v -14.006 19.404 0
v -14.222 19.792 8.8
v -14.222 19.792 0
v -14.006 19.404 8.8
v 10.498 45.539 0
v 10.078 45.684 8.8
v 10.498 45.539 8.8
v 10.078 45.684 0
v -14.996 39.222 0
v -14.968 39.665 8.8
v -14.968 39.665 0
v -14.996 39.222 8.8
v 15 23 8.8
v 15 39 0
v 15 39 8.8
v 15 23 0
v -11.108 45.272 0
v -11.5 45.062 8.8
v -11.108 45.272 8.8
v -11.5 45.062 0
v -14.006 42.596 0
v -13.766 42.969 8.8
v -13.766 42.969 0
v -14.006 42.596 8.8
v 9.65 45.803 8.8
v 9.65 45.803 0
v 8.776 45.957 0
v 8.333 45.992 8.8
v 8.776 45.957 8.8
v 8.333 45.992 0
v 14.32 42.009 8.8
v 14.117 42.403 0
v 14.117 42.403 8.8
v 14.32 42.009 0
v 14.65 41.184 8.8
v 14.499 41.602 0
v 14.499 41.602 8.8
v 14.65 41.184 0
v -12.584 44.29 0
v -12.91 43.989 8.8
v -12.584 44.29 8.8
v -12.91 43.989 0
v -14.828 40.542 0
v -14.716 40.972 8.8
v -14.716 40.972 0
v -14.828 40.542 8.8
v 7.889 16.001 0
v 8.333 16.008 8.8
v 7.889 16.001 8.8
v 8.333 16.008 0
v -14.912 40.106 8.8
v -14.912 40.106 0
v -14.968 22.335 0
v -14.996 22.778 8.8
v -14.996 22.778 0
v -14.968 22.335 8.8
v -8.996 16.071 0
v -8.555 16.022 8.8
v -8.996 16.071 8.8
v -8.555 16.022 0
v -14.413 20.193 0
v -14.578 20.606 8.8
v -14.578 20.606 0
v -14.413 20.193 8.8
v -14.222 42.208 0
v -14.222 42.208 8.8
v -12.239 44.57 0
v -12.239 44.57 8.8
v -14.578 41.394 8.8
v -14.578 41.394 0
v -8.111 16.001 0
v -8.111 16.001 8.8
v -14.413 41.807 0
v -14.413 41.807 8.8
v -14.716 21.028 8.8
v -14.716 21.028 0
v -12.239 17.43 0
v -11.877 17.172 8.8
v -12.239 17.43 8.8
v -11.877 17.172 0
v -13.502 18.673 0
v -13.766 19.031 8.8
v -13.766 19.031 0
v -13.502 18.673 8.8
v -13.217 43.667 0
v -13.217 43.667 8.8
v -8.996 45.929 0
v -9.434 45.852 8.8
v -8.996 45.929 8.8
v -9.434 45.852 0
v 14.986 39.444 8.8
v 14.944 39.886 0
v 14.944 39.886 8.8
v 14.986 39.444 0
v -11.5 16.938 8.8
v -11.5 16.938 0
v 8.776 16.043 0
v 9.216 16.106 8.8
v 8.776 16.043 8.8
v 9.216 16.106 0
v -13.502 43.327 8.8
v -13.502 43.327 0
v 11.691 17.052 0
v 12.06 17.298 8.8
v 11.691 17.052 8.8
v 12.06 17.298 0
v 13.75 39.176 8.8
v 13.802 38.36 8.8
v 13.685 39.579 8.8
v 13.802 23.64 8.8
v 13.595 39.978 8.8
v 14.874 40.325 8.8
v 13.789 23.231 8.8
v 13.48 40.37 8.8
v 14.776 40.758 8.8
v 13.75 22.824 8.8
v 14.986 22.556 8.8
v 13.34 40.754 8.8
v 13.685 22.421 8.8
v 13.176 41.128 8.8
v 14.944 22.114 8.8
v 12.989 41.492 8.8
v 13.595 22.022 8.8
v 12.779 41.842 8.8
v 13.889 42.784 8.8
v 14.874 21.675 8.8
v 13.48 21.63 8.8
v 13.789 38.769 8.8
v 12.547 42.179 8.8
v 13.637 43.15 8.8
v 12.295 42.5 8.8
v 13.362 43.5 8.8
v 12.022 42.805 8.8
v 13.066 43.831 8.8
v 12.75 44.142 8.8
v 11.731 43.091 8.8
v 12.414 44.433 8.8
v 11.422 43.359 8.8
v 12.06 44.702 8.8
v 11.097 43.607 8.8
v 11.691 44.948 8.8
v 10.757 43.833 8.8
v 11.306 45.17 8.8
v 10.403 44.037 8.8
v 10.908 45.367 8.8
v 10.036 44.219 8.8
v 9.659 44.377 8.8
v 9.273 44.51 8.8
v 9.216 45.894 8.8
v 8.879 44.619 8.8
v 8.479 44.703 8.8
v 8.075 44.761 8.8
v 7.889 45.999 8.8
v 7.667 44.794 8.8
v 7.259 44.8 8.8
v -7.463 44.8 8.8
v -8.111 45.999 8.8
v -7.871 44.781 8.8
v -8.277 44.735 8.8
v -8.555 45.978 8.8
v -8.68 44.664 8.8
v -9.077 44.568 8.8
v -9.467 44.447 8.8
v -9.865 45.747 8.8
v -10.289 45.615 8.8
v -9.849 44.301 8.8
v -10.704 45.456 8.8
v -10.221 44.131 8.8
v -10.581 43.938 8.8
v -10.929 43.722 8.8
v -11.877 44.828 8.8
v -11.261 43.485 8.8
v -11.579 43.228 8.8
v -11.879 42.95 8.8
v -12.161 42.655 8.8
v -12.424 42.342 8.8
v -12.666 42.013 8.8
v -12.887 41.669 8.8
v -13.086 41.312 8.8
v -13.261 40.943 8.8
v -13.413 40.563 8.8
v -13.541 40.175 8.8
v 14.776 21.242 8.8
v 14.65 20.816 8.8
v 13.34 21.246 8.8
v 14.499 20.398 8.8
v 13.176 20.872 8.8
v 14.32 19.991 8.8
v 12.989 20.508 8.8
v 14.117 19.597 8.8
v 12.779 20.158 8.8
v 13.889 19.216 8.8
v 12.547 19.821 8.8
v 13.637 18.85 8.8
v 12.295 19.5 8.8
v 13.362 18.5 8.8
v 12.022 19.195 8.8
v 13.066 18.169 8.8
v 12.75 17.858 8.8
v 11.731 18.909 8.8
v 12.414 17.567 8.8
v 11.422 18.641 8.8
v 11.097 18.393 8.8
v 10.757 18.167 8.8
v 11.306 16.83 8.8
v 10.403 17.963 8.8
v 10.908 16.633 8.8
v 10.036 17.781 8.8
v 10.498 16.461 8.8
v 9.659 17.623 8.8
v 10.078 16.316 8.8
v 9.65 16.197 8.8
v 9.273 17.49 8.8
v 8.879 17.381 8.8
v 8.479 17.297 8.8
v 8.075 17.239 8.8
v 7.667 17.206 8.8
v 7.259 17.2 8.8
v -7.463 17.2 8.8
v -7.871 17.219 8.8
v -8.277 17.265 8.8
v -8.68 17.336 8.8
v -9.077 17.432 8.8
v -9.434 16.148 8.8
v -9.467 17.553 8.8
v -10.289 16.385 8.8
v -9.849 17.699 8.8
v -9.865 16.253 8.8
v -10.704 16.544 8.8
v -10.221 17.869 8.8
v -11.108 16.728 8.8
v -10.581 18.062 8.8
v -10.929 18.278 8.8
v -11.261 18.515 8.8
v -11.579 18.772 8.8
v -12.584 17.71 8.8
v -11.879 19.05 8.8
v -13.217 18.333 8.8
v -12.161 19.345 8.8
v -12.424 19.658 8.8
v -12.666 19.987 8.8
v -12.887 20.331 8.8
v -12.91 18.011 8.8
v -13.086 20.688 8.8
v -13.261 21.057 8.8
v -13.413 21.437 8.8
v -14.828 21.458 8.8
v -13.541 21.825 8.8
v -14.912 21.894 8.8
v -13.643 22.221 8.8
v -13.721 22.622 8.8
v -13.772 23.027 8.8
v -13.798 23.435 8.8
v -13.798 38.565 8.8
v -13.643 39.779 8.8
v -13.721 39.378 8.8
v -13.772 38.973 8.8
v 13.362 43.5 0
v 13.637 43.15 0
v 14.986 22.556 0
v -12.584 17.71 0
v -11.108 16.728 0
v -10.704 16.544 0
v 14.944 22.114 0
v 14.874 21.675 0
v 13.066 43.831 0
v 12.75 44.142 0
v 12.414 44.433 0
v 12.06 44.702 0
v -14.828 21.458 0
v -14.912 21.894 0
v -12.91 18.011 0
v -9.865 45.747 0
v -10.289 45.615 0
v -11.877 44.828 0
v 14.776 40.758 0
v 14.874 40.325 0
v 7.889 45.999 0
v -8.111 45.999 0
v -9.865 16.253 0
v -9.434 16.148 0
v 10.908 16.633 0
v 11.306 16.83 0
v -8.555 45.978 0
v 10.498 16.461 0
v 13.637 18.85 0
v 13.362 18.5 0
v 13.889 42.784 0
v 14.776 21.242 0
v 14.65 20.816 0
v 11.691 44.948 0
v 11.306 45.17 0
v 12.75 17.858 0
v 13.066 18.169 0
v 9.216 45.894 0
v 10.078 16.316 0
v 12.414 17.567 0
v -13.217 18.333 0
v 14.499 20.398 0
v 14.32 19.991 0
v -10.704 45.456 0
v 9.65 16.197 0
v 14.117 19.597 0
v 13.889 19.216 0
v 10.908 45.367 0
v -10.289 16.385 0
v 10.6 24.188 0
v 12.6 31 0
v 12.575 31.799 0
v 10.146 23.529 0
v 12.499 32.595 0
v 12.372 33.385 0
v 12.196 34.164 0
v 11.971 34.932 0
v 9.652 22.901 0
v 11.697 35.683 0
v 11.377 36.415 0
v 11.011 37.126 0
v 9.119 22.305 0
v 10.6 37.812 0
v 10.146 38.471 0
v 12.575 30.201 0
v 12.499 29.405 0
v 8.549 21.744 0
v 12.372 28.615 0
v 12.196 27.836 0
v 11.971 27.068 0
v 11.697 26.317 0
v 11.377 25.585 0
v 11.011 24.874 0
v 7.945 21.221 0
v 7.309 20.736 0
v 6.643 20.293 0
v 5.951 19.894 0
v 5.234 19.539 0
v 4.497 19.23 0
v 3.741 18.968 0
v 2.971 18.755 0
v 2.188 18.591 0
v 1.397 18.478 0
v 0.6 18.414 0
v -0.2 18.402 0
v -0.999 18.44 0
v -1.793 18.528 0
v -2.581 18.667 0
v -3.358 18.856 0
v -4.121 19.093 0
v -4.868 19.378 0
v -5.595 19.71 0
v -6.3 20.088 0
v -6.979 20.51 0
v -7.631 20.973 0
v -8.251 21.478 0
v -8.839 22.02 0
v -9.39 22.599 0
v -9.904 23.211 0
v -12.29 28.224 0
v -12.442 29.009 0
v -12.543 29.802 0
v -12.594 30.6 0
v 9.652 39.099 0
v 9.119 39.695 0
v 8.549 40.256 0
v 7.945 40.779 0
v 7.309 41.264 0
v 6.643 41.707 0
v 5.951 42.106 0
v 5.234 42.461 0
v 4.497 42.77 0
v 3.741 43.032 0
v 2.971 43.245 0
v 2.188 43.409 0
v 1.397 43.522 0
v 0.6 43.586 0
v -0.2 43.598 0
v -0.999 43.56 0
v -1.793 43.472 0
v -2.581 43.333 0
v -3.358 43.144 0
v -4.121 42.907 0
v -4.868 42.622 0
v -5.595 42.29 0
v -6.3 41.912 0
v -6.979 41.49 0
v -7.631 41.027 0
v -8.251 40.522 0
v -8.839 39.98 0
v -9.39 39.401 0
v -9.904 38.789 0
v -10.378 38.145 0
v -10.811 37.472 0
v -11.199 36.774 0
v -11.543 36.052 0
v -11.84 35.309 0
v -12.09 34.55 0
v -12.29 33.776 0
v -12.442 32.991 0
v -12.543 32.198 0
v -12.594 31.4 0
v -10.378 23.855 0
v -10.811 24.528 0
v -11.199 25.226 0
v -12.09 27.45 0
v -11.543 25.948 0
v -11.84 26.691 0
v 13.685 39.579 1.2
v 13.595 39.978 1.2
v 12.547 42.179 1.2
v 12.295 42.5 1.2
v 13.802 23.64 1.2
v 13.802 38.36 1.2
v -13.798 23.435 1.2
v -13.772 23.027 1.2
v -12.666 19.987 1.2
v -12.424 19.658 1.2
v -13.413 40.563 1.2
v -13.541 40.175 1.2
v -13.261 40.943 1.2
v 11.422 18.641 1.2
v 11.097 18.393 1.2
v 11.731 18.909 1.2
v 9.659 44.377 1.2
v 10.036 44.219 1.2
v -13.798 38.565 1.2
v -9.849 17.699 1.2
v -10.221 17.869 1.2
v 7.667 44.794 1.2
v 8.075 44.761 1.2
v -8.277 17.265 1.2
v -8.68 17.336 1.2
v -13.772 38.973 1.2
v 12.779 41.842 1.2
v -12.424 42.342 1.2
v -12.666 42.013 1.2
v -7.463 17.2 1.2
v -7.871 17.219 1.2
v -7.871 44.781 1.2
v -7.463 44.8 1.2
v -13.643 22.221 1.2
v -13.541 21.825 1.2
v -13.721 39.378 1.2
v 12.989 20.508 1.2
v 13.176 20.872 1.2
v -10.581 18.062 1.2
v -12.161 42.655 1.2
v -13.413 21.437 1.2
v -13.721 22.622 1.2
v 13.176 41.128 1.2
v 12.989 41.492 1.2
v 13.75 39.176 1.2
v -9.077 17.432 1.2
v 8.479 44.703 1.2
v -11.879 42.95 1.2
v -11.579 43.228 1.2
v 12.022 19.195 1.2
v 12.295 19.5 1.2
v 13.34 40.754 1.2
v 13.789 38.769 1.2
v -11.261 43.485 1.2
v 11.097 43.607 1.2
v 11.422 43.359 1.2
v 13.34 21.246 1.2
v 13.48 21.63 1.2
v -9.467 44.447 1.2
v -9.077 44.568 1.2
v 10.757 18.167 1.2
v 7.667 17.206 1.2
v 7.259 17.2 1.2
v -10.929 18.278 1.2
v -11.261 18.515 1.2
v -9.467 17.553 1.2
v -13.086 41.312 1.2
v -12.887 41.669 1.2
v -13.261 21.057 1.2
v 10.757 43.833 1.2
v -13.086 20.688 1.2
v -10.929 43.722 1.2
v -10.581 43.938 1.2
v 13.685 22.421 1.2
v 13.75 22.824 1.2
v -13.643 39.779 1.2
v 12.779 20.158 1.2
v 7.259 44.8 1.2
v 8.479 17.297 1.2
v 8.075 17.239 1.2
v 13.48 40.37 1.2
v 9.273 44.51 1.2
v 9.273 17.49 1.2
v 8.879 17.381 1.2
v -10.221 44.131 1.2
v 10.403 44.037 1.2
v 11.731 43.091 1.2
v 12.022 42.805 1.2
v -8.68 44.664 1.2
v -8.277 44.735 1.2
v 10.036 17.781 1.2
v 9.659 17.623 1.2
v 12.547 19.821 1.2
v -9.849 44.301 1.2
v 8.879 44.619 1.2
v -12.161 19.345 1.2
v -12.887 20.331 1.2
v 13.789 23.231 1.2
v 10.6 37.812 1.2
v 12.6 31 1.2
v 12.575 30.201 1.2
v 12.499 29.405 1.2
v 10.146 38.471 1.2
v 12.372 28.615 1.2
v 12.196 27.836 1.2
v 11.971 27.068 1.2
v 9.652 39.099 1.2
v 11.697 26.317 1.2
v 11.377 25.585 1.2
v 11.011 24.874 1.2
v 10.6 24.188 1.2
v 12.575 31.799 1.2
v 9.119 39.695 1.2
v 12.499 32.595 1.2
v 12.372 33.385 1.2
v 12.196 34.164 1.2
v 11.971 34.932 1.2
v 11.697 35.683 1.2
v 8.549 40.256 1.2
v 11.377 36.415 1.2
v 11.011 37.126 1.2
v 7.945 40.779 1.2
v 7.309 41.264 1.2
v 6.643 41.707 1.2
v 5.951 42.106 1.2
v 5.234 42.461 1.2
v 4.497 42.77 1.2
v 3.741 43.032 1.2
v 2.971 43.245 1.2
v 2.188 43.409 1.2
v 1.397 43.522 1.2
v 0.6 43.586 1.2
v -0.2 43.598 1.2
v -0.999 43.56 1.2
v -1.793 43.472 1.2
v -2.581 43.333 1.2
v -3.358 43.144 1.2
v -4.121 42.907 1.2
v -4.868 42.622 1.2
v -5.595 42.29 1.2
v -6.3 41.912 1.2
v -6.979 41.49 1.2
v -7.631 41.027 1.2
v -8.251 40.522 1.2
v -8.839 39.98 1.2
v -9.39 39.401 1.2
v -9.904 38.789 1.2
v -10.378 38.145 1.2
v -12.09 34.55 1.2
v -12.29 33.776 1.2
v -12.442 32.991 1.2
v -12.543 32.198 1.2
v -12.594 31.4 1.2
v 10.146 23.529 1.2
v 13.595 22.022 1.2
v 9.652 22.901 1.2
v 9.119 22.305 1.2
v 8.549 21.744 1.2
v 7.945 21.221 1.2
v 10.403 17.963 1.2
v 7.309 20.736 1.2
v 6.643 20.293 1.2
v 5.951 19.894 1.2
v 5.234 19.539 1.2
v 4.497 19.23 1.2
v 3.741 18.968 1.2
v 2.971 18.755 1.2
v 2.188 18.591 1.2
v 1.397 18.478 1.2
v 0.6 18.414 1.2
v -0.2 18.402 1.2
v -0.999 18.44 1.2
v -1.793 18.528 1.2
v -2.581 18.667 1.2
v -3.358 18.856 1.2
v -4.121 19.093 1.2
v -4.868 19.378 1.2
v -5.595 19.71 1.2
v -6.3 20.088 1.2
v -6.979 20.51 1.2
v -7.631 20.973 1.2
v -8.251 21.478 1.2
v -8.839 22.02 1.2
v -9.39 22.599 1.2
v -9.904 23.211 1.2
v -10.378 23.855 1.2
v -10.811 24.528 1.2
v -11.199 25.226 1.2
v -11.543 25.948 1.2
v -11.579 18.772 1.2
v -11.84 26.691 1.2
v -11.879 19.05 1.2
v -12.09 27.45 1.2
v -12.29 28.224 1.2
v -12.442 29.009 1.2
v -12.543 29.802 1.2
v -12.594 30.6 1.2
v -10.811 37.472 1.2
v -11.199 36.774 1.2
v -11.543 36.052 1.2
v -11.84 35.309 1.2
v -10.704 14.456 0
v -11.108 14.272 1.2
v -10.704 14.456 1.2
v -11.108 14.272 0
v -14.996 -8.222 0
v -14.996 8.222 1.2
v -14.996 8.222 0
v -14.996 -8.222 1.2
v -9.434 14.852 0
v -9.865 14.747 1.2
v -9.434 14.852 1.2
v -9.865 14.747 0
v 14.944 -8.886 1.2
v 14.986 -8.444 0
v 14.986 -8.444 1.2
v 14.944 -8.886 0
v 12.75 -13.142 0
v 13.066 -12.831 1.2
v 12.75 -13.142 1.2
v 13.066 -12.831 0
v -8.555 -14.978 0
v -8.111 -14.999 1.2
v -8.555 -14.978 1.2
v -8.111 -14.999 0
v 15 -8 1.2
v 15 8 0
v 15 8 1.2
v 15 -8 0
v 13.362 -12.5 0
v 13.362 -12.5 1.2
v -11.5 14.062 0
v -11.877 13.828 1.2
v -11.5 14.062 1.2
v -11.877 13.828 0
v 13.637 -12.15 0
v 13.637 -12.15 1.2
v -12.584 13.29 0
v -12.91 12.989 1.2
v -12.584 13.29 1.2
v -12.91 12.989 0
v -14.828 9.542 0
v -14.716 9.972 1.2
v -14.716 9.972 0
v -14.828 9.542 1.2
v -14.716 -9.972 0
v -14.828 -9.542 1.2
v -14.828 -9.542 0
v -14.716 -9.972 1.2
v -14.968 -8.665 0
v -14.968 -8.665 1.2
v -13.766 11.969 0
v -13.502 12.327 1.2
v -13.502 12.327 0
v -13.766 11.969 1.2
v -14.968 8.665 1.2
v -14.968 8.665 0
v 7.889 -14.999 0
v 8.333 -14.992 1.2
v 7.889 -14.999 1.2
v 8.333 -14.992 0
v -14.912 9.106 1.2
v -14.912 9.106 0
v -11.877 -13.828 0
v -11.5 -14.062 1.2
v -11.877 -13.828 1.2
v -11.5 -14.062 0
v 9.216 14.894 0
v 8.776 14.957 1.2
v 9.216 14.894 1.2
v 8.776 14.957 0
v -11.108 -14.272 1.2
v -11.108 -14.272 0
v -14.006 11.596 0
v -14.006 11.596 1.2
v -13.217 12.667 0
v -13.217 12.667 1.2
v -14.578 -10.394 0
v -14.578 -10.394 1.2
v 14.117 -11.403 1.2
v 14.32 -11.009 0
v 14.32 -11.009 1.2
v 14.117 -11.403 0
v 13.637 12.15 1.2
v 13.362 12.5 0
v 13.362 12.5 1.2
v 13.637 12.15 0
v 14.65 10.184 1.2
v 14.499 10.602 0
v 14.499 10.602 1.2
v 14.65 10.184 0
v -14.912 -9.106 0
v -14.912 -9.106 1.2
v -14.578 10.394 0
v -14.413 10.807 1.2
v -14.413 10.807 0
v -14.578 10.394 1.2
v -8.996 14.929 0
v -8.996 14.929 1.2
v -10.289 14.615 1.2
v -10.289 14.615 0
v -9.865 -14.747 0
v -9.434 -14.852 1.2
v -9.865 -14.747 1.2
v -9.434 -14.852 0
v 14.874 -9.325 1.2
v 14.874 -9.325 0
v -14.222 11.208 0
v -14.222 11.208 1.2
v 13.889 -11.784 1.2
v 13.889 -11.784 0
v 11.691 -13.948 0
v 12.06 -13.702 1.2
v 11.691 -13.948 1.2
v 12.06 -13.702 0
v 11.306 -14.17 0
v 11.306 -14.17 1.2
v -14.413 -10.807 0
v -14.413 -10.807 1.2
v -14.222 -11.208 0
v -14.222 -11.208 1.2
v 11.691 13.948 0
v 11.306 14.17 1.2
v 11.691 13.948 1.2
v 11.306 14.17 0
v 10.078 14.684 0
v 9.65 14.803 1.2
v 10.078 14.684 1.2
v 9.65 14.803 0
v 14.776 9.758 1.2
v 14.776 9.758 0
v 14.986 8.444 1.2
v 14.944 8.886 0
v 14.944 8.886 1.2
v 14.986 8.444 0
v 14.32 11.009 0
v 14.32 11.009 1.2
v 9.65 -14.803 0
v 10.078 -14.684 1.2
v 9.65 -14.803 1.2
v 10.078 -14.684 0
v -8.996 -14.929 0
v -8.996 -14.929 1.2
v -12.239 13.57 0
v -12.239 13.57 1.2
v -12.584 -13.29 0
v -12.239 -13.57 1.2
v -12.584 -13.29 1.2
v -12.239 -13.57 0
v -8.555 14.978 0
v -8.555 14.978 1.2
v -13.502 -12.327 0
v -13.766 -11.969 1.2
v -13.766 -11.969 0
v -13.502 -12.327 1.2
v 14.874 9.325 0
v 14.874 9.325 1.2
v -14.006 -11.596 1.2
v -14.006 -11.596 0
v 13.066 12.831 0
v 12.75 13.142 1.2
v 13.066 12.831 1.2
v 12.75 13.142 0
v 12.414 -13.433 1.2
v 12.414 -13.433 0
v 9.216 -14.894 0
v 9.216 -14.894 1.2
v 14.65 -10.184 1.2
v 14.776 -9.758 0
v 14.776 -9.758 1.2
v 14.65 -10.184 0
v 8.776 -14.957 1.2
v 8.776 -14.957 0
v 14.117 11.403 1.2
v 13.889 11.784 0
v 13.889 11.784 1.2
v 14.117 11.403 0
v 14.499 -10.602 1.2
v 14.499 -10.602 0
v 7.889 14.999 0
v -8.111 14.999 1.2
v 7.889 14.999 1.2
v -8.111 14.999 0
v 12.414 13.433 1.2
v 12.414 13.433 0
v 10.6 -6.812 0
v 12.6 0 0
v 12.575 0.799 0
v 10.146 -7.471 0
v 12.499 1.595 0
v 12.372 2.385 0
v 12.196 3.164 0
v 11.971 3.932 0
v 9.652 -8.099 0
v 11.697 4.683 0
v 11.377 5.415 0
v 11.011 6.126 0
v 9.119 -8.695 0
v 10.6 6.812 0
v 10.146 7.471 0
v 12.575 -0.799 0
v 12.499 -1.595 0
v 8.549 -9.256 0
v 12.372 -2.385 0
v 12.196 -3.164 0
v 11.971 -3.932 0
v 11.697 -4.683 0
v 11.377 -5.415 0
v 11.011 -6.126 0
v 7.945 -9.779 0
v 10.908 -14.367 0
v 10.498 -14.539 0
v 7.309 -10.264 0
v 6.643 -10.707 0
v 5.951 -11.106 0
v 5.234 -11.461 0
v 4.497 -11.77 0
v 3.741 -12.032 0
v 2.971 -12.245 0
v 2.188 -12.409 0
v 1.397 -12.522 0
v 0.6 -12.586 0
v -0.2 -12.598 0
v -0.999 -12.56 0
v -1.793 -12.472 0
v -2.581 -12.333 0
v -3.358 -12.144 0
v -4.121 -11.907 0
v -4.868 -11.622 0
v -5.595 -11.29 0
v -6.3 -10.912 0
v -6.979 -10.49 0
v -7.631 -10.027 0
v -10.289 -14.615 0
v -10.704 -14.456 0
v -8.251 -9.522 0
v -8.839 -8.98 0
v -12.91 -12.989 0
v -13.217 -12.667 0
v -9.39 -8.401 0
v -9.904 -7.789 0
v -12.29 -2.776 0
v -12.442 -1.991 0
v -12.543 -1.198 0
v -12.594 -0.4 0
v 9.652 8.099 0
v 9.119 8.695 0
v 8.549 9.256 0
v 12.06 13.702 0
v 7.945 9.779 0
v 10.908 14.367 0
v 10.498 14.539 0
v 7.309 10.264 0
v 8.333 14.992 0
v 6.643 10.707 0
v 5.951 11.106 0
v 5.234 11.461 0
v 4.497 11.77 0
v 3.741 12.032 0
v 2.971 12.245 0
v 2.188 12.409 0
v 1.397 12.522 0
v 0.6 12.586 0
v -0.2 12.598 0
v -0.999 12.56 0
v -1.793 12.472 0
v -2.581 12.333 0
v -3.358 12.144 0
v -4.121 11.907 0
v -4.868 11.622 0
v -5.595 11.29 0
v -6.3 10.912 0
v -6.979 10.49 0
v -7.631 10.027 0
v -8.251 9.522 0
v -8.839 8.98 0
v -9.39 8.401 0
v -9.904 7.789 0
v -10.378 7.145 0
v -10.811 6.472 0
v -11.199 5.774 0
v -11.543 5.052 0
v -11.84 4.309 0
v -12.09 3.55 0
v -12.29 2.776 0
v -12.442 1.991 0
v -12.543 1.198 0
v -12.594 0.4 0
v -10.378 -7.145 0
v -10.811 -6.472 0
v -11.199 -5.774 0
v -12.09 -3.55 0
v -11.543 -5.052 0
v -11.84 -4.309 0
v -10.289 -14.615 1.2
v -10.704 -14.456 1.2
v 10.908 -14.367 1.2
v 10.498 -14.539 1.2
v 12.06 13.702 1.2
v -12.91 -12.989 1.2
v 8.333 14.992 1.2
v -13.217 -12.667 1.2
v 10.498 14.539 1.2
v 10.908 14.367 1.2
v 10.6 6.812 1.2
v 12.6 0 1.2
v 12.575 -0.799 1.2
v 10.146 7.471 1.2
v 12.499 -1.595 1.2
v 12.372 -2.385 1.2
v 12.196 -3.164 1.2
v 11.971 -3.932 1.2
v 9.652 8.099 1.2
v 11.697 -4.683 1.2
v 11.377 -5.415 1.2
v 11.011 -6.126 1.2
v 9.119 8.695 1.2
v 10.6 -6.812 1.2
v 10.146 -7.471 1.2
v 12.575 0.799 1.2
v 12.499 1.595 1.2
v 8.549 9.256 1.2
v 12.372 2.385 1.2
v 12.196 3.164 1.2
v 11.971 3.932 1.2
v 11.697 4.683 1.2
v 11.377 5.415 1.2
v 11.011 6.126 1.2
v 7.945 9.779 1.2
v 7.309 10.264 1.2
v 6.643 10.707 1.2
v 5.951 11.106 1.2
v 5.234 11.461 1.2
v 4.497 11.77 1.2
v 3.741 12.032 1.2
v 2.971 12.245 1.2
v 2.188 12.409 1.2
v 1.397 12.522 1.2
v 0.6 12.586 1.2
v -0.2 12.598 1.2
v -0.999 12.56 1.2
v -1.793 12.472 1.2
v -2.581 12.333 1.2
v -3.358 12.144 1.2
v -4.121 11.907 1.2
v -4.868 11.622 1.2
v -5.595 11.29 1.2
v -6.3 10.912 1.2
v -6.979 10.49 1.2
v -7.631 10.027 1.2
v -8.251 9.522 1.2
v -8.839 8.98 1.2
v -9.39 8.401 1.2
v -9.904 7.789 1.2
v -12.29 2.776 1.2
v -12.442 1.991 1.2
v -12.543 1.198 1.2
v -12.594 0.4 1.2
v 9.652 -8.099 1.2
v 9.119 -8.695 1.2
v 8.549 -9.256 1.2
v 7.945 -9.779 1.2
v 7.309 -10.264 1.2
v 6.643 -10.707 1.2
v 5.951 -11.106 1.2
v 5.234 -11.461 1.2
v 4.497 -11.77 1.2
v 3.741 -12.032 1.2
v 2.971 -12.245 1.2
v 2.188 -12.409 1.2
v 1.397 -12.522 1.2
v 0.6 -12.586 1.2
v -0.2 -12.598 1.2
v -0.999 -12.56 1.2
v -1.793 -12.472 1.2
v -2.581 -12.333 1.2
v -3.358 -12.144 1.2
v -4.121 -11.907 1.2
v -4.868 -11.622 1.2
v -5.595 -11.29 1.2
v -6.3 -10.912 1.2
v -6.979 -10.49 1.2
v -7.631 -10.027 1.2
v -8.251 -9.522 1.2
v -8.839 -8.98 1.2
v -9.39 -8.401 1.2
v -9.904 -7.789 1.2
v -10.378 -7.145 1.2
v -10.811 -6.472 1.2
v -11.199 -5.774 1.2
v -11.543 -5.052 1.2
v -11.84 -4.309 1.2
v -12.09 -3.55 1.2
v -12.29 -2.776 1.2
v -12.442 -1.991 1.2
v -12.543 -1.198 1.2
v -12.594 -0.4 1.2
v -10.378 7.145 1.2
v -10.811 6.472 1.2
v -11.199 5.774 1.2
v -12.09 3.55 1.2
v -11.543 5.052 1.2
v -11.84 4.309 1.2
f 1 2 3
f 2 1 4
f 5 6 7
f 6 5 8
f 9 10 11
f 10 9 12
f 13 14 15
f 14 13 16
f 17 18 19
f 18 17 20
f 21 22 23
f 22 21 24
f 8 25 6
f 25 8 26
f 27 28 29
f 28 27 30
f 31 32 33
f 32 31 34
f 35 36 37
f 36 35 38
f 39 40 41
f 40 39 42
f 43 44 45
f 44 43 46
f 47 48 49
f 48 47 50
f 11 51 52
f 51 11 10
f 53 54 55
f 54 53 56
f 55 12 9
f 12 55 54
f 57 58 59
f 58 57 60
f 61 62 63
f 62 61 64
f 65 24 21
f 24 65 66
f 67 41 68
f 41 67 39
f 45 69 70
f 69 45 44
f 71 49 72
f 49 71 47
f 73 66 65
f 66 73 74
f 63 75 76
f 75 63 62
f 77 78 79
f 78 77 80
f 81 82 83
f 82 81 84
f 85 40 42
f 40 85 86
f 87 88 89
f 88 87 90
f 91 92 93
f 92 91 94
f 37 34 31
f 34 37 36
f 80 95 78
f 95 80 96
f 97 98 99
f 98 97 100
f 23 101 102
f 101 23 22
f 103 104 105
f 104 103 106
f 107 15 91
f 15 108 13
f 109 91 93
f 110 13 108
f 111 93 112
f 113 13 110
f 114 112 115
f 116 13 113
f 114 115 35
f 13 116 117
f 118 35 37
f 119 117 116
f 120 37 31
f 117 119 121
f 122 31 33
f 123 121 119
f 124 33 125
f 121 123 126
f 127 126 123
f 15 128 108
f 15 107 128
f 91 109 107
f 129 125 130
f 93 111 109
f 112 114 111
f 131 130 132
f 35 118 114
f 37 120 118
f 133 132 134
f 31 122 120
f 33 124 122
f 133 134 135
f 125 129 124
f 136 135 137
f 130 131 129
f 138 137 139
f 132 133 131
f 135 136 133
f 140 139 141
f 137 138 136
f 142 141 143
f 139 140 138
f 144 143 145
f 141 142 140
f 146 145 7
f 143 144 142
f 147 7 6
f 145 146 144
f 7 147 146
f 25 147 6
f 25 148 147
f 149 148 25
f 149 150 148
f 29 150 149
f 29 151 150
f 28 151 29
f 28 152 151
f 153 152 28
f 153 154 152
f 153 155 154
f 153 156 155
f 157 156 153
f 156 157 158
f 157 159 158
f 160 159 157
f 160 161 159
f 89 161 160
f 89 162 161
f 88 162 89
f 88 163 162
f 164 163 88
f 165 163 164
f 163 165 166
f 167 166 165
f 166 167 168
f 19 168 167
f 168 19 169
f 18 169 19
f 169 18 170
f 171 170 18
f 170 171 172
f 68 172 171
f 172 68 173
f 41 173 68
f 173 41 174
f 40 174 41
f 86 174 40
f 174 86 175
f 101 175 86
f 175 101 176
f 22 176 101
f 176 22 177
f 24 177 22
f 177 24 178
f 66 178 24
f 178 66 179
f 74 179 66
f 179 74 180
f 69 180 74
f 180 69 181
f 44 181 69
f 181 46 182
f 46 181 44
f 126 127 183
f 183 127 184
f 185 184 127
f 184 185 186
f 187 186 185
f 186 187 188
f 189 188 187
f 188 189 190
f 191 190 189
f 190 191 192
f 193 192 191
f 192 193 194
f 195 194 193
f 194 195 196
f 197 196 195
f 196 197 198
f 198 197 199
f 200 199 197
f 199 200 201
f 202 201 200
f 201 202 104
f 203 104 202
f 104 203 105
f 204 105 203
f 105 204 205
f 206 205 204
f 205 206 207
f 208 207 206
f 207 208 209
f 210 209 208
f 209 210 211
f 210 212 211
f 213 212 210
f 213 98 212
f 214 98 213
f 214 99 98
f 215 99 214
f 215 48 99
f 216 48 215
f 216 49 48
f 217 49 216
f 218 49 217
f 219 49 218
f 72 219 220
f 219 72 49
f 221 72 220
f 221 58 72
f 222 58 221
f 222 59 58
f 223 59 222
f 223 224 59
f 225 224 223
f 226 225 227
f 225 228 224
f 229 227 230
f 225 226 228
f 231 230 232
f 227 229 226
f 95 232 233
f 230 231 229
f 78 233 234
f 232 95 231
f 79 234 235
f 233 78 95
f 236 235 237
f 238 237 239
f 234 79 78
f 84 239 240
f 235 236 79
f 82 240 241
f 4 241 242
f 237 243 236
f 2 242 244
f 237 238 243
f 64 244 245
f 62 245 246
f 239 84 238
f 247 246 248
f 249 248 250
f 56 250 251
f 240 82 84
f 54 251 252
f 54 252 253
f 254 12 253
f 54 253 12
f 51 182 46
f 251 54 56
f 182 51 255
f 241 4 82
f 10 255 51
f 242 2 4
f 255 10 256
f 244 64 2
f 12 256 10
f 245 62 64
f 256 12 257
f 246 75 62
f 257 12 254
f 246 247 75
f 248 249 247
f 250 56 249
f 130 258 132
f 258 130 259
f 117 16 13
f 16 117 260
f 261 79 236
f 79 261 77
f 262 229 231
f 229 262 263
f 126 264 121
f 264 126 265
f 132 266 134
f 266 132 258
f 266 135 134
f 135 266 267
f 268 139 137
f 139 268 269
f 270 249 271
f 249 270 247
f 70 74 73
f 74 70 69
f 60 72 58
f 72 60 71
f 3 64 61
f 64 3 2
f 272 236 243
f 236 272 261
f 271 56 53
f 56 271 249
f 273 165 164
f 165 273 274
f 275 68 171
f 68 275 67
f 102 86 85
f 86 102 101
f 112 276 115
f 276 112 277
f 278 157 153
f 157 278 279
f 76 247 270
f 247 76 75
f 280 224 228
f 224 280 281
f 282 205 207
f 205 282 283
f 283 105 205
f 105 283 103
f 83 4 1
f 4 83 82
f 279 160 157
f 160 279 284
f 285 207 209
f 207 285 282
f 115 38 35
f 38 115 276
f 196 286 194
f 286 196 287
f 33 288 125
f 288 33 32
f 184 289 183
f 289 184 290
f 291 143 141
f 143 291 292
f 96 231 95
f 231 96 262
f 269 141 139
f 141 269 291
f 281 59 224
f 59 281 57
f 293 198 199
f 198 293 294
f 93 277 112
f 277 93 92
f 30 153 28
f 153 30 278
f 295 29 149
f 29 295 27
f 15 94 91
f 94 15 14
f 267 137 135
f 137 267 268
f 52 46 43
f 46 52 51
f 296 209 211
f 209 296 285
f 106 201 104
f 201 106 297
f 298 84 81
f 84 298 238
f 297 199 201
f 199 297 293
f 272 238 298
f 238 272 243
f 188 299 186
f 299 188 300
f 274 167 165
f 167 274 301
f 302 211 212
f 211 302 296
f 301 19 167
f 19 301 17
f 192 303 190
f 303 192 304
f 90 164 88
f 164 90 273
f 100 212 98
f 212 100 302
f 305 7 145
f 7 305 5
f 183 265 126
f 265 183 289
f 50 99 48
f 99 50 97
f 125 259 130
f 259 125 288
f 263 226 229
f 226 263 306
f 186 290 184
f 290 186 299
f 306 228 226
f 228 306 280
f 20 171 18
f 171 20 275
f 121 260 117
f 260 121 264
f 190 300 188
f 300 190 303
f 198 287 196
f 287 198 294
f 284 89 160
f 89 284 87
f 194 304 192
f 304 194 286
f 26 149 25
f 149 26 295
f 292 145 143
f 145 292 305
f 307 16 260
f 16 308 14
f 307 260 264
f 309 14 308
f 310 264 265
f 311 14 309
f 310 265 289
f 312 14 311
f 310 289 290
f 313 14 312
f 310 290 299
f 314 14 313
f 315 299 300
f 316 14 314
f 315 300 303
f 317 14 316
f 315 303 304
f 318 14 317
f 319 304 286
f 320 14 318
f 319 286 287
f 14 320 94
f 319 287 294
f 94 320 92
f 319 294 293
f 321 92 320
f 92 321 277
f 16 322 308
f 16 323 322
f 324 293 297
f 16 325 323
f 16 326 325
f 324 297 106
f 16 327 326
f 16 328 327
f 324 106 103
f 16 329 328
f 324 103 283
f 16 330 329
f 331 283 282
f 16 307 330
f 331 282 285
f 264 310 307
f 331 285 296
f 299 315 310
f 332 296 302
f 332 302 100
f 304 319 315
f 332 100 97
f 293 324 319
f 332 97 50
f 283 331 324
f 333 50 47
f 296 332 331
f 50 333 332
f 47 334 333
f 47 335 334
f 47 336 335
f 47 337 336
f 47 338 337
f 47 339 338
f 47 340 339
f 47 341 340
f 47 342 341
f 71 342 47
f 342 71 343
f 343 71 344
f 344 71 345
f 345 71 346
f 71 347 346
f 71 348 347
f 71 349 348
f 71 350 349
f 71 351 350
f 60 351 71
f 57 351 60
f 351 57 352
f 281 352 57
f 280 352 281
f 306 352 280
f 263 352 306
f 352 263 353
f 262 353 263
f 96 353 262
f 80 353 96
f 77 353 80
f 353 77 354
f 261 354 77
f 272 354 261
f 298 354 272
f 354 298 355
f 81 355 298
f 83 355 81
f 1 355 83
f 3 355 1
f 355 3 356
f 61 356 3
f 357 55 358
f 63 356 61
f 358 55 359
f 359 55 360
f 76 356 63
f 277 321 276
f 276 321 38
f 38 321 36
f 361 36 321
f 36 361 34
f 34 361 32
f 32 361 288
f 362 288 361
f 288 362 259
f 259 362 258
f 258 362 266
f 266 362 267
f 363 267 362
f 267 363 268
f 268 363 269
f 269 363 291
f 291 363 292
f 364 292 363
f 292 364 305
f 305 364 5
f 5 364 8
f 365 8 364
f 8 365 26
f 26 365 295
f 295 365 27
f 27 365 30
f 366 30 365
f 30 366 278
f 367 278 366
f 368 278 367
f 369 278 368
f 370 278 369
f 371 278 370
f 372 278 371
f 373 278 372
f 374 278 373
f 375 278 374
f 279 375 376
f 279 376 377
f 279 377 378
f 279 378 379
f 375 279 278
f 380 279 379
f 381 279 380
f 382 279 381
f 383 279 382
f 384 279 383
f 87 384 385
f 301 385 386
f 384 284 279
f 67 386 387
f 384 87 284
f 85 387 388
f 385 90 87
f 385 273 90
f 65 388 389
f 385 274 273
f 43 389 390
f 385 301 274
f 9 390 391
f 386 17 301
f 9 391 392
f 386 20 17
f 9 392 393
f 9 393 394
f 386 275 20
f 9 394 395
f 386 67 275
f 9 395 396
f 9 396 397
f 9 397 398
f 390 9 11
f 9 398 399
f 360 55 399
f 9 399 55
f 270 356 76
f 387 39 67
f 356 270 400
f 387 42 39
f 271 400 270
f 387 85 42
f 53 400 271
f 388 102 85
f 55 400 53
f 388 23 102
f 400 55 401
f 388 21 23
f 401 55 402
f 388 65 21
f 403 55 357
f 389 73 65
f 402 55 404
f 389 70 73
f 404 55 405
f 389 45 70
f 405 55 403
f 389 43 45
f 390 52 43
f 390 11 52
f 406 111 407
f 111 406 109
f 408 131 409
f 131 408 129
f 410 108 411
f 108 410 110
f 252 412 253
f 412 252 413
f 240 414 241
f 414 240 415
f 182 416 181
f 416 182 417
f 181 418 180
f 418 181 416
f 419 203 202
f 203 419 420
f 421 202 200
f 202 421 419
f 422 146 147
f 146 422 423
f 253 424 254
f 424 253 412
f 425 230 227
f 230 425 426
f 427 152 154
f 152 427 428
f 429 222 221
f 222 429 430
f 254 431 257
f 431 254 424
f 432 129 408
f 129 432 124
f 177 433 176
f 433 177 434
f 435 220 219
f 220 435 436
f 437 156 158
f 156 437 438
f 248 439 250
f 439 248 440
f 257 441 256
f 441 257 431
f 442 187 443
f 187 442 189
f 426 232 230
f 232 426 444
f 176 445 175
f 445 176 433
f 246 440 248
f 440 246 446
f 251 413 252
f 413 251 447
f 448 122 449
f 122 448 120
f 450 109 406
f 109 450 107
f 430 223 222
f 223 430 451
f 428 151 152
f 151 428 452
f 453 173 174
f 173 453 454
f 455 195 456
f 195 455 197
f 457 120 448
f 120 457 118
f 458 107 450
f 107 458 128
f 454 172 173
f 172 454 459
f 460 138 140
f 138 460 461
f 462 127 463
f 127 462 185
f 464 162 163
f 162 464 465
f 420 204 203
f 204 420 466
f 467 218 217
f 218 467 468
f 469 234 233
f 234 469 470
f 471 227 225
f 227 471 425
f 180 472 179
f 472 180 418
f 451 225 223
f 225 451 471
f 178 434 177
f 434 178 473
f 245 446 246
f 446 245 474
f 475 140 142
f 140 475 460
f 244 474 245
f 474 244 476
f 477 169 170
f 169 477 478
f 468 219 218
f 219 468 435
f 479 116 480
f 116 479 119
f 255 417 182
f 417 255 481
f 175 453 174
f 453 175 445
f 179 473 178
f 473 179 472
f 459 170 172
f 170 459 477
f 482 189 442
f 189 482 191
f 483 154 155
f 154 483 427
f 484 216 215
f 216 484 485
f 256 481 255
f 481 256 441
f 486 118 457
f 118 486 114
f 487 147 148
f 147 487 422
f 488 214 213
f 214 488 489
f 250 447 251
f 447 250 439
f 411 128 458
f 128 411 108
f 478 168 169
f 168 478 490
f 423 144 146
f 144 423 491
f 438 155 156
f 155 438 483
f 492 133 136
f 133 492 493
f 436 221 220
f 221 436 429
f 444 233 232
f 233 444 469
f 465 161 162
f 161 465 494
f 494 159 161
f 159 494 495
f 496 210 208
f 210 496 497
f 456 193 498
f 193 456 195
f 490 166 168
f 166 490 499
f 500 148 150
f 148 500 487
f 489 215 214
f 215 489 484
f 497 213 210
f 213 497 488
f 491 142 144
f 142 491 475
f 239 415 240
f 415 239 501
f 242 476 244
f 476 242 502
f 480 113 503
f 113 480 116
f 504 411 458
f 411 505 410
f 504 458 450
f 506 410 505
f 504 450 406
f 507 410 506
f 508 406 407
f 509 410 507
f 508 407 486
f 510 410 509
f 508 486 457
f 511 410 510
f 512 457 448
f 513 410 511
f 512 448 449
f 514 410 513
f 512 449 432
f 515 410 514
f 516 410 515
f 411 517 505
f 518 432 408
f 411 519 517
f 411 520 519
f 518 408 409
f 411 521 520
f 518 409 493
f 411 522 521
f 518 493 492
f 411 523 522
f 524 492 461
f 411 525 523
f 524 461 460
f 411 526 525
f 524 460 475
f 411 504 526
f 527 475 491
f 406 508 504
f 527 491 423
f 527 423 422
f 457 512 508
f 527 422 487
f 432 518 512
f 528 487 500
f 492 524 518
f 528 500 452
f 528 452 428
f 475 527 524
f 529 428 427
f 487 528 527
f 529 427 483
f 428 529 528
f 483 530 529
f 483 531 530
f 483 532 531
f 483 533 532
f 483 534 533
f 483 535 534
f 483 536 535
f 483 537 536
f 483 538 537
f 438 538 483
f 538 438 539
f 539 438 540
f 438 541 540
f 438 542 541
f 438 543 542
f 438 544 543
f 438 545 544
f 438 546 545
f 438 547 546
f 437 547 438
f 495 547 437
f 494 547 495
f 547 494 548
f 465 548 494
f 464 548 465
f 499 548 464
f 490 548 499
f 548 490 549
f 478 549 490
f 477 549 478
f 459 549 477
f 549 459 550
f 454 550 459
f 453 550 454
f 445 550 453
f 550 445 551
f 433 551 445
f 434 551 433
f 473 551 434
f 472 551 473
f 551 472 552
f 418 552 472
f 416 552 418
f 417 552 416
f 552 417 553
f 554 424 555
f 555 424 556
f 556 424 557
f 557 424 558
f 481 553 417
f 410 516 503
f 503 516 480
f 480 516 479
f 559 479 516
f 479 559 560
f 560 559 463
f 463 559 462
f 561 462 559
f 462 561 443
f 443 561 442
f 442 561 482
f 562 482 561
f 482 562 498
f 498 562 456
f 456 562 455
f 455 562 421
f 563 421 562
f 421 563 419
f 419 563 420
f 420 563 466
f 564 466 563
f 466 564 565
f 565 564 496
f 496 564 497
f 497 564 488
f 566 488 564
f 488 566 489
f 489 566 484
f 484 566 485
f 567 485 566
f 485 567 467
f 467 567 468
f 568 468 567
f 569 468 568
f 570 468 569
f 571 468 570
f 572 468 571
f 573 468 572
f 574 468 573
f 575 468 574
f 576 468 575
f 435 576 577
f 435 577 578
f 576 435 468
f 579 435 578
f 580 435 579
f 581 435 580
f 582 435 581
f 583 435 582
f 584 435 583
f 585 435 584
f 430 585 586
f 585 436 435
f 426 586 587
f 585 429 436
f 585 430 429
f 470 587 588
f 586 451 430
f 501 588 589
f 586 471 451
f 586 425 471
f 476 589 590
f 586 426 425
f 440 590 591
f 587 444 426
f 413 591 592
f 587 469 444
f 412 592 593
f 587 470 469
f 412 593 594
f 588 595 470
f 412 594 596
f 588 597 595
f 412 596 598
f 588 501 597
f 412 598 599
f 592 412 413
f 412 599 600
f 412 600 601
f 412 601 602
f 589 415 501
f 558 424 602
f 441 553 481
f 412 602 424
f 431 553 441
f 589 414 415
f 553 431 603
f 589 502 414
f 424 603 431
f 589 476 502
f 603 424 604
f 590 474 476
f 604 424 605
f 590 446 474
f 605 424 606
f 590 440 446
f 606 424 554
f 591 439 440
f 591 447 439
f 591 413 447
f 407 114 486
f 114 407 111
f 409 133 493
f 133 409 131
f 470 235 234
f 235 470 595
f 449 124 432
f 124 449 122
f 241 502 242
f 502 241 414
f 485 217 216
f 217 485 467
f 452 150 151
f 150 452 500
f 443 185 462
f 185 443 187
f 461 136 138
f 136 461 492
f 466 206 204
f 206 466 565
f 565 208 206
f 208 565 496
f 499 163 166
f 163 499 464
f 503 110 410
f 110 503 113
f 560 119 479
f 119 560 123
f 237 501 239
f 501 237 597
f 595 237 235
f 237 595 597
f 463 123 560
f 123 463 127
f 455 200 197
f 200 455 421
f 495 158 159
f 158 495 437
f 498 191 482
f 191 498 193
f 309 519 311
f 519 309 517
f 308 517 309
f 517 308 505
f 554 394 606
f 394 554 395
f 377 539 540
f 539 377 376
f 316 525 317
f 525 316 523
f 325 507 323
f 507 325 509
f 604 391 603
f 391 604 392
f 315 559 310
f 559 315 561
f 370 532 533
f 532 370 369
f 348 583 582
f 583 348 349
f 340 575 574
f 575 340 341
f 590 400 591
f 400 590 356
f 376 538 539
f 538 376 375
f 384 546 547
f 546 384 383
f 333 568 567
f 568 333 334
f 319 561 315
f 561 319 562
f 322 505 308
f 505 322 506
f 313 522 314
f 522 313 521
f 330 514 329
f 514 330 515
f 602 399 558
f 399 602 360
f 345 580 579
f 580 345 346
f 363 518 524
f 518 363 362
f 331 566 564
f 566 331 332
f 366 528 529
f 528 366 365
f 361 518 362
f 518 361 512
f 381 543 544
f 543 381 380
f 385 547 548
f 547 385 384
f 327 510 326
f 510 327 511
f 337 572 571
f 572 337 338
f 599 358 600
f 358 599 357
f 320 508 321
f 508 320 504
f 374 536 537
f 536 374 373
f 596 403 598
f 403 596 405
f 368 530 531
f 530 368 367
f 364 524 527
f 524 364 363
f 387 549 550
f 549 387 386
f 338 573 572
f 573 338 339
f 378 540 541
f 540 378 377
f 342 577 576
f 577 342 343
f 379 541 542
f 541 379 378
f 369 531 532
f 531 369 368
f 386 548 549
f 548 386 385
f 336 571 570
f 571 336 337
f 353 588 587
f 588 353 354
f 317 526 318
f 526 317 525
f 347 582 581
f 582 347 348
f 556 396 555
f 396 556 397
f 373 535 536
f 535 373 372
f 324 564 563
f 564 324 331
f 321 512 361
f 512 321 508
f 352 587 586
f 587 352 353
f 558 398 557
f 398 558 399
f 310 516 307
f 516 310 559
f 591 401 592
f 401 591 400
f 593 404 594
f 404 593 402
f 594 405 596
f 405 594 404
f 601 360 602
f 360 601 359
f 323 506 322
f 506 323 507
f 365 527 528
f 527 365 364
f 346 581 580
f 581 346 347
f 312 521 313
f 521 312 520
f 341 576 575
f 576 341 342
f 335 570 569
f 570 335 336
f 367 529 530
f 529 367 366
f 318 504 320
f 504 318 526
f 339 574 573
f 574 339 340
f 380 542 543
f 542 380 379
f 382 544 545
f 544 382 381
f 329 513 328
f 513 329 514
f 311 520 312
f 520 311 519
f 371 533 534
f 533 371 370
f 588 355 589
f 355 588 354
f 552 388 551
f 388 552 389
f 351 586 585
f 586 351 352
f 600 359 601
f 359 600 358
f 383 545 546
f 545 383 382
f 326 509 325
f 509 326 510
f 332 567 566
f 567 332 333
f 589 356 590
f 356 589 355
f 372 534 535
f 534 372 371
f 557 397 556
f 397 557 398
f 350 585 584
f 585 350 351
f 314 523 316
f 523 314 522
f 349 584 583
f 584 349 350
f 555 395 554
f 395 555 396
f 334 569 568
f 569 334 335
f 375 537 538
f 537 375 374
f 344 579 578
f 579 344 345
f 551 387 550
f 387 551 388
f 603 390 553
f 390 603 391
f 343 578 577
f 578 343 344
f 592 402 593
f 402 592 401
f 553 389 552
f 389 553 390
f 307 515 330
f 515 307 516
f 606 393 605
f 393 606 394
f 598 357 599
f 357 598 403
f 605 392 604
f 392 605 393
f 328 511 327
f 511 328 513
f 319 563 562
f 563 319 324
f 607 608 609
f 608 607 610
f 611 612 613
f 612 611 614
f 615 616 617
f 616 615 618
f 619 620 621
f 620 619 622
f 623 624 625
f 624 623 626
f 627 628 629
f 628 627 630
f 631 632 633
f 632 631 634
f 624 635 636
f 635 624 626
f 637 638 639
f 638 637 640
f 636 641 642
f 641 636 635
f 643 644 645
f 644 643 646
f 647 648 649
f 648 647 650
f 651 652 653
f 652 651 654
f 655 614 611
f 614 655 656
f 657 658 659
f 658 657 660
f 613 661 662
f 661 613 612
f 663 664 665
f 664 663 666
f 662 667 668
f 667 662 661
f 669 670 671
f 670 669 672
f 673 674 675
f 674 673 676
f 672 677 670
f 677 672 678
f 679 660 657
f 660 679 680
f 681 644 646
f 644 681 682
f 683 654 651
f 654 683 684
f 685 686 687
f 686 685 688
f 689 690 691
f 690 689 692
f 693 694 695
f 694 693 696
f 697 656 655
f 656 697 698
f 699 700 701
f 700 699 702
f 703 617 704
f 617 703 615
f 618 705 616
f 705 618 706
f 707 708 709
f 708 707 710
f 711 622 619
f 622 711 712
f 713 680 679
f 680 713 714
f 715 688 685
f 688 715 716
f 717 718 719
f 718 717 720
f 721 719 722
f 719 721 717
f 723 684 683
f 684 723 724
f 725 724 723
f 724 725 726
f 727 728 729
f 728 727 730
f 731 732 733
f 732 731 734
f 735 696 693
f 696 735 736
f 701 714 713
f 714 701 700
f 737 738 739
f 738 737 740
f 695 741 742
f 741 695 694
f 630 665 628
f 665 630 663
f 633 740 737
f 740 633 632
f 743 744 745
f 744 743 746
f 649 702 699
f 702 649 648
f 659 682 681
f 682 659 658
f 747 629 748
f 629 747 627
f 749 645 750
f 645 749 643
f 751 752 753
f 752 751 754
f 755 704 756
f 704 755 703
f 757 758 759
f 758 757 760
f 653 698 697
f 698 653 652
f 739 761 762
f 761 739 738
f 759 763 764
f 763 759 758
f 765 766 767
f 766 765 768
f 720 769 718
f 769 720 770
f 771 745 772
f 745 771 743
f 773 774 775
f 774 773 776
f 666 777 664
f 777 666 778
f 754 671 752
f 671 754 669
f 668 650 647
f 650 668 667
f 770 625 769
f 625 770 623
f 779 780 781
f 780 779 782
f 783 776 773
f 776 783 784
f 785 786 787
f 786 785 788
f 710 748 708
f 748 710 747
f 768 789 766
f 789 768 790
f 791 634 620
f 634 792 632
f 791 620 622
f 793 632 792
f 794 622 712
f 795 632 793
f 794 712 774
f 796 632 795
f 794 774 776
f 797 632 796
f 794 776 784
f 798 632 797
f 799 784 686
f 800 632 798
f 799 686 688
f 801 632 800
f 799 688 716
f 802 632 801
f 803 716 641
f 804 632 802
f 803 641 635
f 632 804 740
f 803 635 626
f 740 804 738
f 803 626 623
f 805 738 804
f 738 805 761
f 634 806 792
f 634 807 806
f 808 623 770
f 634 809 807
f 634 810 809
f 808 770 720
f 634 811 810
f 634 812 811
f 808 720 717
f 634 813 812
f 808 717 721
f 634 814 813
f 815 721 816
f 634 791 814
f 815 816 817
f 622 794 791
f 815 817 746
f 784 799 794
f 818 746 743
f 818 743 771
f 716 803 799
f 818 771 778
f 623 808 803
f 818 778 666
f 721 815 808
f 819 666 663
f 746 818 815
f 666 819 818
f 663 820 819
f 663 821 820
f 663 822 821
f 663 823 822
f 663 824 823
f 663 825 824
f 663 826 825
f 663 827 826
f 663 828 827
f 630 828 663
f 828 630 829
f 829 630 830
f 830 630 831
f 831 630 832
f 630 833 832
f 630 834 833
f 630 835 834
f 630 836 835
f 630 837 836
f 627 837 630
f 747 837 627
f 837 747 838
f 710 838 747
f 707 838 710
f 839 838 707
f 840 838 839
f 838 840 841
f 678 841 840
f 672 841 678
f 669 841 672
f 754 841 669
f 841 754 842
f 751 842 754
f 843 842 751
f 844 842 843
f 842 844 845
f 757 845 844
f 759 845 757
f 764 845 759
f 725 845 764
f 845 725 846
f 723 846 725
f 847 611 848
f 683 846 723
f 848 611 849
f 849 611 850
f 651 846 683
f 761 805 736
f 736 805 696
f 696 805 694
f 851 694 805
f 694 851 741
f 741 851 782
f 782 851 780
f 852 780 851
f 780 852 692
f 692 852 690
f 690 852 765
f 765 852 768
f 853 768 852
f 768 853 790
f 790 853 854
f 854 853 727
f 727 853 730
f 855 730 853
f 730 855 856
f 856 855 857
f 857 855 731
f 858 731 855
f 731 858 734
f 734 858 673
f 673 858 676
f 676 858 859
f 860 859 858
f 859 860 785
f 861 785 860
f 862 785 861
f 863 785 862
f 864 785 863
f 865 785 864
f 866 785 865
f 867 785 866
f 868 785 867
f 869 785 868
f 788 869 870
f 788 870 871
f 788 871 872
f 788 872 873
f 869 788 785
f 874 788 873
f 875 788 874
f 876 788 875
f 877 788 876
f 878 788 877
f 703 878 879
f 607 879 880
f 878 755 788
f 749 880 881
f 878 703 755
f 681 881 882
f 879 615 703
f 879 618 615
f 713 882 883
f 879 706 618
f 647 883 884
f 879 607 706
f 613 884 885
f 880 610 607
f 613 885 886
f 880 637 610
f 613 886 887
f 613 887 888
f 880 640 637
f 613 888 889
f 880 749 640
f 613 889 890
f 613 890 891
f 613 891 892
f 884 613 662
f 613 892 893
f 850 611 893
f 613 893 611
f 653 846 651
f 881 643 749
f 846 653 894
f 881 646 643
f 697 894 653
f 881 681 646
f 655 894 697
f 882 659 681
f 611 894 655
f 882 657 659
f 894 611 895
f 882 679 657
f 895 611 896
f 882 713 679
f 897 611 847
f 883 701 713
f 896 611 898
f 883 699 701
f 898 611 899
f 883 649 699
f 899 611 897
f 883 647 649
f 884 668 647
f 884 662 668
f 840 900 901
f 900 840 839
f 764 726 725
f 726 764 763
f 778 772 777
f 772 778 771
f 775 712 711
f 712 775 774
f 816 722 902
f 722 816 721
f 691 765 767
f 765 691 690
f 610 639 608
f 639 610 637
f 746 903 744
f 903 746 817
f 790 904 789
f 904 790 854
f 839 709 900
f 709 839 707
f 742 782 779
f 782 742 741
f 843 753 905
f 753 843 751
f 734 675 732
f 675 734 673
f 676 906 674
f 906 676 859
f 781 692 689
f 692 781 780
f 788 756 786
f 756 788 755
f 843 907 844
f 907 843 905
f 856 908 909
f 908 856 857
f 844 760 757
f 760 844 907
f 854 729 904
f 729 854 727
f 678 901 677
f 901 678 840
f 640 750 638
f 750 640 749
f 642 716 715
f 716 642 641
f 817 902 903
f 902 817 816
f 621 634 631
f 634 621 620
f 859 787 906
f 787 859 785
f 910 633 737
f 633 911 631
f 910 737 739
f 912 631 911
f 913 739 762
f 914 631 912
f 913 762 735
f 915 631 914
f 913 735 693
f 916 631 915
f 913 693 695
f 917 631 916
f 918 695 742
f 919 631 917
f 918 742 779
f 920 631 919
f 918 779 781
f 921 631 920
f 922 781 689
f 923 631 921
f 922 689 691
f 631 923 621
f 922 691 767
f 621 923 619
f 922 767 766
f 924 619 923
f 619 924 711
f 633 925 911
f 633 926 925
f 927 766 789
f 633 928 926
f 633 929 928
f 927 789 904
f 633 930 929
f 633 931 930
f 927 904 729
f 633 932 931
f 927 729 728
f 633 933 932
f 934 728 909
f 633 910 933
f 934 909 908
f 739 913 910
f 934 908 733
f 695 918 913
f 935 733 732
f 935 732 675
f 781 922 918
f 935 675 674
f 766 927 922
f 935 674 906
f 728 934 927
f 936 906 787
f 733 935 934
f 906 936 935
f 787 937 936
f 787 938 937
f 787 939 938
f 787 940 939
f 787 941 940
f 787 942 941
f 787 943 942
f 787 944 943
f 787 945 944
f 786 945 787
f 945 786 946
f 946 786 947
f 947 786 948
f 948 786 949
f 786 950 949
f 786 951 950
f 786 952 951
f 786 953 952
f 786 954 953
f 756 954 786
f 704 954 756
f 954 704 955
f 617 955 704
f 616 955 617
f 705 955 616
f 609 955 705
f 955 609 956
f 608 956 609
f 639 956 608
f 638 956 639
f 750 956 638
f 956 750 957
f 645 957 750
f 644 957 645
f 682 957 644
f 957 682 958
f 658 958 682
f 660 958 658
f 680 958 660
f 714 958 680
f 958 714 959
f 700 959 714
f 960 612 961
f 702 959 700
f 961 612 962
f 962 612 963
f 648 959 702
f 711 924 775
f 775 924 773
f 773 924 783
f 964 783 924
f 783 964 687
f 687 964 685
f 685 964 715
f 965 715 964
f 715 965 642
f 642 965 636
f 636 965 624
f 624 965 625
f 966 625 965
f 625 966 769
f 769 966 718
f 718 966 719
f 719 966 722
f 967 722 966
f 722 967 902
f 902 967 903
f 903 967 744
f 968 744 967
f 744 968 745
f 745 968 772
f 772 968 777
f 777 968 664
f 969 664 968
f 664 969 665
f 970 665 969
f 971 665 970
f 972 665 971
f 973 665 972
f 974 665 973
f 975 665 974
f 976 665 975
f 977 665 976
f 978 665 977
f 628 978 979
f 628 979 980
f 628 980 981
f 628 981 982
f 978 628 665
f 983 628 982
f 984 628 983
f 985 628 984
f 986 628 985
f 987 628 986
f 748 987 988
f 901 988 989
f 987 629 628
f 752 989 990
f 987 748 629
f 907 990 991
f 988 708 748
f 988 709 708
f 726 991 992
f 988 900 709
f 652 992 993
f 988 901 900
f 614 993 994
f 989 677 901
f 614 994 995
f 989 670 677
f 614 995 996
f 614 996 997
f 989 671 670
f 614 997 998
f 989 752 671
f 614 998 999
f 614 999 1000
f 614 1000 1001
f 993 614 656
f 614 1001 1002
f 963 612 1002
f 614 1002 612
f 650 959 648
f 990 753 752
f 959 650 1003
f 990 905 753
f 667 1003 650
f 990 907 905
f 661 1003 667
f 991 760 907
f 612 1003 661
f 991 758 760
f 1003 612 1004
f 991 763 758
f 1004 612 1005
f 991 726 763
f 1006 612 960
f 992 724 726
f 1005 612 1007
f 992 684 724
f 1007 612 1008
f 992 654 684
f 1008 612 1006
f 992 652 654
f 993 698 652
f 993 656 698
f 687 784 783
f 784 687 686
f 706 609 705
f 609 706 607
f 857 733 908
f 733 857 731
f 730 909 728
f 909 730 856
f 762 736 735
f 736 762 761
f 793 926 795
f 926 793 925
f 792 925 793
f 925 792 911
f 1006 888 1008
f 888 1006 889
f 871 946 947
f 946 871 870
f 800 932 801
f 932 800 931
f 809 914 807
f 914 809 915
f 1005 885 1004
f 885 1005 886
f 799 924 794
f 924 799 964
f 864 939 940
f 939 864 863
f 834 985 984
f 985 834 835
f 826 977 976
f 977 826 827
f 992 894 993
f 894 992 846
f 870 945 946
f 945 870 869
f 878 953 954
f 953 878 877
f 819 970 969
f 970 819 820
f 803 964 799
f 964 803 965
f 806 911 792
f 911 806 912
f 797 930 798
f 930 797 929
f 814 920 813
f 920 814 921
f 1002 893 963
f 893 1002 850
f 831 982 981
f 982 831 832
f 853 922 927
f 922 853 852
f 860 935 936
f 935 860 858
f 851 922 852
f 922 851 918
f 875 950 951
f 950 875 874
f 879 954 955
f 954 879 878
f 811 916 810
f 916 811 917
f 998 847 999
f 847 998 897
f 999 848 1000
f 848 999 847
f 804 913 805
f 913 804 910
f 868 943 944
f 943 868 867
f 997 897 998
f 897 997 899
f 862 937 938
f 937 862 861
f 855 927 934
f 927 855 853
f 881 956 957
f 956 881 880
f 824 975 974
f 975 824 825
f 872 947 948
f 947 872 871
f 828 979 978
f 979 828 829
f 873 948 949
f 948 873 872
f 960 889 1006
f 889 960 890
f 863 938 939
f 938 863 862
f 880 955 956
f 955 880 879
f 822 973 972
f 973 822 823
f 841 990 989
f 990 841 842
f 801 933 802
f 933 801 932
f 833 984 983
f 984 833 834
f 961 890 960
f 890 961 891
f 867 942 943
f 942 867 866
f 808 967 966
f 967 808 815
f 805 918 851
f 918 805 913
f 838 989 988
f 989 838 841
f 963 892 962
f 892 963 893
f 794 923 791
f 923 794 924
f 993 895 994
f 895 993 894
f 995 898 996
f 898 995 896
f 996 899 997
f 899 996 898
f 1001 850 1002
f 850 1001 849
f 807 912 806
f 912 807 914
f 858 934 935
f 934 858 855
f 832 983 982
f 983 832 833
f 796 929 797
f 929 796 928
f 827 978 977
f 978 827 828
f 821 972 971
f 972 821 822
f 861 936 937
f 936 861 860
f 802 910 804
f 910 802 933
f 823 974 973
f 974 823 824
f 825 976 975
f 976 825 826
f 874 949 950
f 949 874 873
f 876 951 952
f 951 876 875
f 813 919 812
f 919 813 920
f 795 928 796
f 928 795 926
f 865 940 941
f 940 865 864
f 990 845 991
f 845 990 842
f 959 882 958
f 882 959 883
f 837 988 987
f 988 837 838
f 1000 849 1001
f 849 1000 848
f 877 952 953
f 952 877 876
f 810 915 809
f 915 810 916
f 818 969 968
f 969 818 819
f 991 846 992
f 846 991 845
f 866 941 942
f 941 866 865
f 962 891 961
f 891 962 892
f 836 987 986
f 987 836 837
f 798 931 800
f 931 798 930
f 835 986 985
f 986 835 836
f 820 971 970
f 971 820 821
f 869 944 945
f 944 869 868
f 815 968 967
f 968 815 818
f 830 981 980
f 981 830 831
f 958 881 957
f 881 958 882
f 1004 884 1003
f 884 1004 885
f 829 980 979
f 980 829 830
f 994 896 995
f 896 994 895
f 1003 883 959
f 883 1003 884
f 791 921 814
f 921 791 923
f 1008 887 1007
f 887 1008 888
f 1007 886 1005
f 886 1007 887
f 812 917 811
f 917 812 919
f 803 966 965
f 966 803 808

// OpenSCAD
// Project boxes for electronic projects
// TODO: Snap fit connection between lid and box, HELPME
// -----------------------

// Outer width
external_width = 30; // [10:100]

// Outer length
external_length = 30; // [10:100]

// Outer height
external_height = 10; // [5:100]

// Shell thickness
shell_thickness = 1.2; // [0.8:Thin (0.8),1.2:Normal (1.2),1.6:Thick (1.6)]

// Corner radius
radius = 7; // [0:10]

// Cut out a circle to save material (for test prints)
cutout_circle = "yes"; // [yes,no]


height_without_lid = external_height-shell_thickness;

// Modules
// -----------------------

module cyl() {
    cylinder(height_without_lid, radius, radius, center = false, $fn=99);
};

module box() {
    hull() {
        translate([-(external_width/2-radius),-(external_length/2-radius),0])
        cyl();       
        translate([+(external_width/2-radius),-(external_length/2-radius),0])
        cyl();    
        translate([-(external_width/2-radius),+(external_length/2-radius),0])
        cyl();        
        translate([+(external_width/2-radius),+(external_length/2-radius),0])
        cyl();
    }
};

// The box itself
// -----------------------

translate([0,external_length+1,0]) // Move out of the way

difference() {

    // Construct the outer box
    box();

    // Cut out the inner box
    translate([0,0,shell_thickness])
    resize([external_width-2*shell_thickness,external_length-2*shell_thickness,height_without_lid])
    box();
    
    if(cutout_circle=="yes"){
        // Cut out a circle to save material during test prints
        cylinder(h=3*height_without_lid, r=((min(external_width,external_length)-4*shell_thickness)/2), center=true, $fn=99);
    }
}

// The lid
// -----------------------

difference() {
        
    // Base of the Lid
    resize([0,0,shell_thickness])
    box();
  
    if(cutout_circle=="yes"){    
        // Cut out a circle to save material during test prints
        cylinder(h=3*height_without_lid, r=((min(external_width,external_length)-4*shell_thickness)/2), center=true, $fn=99);
    }
}
